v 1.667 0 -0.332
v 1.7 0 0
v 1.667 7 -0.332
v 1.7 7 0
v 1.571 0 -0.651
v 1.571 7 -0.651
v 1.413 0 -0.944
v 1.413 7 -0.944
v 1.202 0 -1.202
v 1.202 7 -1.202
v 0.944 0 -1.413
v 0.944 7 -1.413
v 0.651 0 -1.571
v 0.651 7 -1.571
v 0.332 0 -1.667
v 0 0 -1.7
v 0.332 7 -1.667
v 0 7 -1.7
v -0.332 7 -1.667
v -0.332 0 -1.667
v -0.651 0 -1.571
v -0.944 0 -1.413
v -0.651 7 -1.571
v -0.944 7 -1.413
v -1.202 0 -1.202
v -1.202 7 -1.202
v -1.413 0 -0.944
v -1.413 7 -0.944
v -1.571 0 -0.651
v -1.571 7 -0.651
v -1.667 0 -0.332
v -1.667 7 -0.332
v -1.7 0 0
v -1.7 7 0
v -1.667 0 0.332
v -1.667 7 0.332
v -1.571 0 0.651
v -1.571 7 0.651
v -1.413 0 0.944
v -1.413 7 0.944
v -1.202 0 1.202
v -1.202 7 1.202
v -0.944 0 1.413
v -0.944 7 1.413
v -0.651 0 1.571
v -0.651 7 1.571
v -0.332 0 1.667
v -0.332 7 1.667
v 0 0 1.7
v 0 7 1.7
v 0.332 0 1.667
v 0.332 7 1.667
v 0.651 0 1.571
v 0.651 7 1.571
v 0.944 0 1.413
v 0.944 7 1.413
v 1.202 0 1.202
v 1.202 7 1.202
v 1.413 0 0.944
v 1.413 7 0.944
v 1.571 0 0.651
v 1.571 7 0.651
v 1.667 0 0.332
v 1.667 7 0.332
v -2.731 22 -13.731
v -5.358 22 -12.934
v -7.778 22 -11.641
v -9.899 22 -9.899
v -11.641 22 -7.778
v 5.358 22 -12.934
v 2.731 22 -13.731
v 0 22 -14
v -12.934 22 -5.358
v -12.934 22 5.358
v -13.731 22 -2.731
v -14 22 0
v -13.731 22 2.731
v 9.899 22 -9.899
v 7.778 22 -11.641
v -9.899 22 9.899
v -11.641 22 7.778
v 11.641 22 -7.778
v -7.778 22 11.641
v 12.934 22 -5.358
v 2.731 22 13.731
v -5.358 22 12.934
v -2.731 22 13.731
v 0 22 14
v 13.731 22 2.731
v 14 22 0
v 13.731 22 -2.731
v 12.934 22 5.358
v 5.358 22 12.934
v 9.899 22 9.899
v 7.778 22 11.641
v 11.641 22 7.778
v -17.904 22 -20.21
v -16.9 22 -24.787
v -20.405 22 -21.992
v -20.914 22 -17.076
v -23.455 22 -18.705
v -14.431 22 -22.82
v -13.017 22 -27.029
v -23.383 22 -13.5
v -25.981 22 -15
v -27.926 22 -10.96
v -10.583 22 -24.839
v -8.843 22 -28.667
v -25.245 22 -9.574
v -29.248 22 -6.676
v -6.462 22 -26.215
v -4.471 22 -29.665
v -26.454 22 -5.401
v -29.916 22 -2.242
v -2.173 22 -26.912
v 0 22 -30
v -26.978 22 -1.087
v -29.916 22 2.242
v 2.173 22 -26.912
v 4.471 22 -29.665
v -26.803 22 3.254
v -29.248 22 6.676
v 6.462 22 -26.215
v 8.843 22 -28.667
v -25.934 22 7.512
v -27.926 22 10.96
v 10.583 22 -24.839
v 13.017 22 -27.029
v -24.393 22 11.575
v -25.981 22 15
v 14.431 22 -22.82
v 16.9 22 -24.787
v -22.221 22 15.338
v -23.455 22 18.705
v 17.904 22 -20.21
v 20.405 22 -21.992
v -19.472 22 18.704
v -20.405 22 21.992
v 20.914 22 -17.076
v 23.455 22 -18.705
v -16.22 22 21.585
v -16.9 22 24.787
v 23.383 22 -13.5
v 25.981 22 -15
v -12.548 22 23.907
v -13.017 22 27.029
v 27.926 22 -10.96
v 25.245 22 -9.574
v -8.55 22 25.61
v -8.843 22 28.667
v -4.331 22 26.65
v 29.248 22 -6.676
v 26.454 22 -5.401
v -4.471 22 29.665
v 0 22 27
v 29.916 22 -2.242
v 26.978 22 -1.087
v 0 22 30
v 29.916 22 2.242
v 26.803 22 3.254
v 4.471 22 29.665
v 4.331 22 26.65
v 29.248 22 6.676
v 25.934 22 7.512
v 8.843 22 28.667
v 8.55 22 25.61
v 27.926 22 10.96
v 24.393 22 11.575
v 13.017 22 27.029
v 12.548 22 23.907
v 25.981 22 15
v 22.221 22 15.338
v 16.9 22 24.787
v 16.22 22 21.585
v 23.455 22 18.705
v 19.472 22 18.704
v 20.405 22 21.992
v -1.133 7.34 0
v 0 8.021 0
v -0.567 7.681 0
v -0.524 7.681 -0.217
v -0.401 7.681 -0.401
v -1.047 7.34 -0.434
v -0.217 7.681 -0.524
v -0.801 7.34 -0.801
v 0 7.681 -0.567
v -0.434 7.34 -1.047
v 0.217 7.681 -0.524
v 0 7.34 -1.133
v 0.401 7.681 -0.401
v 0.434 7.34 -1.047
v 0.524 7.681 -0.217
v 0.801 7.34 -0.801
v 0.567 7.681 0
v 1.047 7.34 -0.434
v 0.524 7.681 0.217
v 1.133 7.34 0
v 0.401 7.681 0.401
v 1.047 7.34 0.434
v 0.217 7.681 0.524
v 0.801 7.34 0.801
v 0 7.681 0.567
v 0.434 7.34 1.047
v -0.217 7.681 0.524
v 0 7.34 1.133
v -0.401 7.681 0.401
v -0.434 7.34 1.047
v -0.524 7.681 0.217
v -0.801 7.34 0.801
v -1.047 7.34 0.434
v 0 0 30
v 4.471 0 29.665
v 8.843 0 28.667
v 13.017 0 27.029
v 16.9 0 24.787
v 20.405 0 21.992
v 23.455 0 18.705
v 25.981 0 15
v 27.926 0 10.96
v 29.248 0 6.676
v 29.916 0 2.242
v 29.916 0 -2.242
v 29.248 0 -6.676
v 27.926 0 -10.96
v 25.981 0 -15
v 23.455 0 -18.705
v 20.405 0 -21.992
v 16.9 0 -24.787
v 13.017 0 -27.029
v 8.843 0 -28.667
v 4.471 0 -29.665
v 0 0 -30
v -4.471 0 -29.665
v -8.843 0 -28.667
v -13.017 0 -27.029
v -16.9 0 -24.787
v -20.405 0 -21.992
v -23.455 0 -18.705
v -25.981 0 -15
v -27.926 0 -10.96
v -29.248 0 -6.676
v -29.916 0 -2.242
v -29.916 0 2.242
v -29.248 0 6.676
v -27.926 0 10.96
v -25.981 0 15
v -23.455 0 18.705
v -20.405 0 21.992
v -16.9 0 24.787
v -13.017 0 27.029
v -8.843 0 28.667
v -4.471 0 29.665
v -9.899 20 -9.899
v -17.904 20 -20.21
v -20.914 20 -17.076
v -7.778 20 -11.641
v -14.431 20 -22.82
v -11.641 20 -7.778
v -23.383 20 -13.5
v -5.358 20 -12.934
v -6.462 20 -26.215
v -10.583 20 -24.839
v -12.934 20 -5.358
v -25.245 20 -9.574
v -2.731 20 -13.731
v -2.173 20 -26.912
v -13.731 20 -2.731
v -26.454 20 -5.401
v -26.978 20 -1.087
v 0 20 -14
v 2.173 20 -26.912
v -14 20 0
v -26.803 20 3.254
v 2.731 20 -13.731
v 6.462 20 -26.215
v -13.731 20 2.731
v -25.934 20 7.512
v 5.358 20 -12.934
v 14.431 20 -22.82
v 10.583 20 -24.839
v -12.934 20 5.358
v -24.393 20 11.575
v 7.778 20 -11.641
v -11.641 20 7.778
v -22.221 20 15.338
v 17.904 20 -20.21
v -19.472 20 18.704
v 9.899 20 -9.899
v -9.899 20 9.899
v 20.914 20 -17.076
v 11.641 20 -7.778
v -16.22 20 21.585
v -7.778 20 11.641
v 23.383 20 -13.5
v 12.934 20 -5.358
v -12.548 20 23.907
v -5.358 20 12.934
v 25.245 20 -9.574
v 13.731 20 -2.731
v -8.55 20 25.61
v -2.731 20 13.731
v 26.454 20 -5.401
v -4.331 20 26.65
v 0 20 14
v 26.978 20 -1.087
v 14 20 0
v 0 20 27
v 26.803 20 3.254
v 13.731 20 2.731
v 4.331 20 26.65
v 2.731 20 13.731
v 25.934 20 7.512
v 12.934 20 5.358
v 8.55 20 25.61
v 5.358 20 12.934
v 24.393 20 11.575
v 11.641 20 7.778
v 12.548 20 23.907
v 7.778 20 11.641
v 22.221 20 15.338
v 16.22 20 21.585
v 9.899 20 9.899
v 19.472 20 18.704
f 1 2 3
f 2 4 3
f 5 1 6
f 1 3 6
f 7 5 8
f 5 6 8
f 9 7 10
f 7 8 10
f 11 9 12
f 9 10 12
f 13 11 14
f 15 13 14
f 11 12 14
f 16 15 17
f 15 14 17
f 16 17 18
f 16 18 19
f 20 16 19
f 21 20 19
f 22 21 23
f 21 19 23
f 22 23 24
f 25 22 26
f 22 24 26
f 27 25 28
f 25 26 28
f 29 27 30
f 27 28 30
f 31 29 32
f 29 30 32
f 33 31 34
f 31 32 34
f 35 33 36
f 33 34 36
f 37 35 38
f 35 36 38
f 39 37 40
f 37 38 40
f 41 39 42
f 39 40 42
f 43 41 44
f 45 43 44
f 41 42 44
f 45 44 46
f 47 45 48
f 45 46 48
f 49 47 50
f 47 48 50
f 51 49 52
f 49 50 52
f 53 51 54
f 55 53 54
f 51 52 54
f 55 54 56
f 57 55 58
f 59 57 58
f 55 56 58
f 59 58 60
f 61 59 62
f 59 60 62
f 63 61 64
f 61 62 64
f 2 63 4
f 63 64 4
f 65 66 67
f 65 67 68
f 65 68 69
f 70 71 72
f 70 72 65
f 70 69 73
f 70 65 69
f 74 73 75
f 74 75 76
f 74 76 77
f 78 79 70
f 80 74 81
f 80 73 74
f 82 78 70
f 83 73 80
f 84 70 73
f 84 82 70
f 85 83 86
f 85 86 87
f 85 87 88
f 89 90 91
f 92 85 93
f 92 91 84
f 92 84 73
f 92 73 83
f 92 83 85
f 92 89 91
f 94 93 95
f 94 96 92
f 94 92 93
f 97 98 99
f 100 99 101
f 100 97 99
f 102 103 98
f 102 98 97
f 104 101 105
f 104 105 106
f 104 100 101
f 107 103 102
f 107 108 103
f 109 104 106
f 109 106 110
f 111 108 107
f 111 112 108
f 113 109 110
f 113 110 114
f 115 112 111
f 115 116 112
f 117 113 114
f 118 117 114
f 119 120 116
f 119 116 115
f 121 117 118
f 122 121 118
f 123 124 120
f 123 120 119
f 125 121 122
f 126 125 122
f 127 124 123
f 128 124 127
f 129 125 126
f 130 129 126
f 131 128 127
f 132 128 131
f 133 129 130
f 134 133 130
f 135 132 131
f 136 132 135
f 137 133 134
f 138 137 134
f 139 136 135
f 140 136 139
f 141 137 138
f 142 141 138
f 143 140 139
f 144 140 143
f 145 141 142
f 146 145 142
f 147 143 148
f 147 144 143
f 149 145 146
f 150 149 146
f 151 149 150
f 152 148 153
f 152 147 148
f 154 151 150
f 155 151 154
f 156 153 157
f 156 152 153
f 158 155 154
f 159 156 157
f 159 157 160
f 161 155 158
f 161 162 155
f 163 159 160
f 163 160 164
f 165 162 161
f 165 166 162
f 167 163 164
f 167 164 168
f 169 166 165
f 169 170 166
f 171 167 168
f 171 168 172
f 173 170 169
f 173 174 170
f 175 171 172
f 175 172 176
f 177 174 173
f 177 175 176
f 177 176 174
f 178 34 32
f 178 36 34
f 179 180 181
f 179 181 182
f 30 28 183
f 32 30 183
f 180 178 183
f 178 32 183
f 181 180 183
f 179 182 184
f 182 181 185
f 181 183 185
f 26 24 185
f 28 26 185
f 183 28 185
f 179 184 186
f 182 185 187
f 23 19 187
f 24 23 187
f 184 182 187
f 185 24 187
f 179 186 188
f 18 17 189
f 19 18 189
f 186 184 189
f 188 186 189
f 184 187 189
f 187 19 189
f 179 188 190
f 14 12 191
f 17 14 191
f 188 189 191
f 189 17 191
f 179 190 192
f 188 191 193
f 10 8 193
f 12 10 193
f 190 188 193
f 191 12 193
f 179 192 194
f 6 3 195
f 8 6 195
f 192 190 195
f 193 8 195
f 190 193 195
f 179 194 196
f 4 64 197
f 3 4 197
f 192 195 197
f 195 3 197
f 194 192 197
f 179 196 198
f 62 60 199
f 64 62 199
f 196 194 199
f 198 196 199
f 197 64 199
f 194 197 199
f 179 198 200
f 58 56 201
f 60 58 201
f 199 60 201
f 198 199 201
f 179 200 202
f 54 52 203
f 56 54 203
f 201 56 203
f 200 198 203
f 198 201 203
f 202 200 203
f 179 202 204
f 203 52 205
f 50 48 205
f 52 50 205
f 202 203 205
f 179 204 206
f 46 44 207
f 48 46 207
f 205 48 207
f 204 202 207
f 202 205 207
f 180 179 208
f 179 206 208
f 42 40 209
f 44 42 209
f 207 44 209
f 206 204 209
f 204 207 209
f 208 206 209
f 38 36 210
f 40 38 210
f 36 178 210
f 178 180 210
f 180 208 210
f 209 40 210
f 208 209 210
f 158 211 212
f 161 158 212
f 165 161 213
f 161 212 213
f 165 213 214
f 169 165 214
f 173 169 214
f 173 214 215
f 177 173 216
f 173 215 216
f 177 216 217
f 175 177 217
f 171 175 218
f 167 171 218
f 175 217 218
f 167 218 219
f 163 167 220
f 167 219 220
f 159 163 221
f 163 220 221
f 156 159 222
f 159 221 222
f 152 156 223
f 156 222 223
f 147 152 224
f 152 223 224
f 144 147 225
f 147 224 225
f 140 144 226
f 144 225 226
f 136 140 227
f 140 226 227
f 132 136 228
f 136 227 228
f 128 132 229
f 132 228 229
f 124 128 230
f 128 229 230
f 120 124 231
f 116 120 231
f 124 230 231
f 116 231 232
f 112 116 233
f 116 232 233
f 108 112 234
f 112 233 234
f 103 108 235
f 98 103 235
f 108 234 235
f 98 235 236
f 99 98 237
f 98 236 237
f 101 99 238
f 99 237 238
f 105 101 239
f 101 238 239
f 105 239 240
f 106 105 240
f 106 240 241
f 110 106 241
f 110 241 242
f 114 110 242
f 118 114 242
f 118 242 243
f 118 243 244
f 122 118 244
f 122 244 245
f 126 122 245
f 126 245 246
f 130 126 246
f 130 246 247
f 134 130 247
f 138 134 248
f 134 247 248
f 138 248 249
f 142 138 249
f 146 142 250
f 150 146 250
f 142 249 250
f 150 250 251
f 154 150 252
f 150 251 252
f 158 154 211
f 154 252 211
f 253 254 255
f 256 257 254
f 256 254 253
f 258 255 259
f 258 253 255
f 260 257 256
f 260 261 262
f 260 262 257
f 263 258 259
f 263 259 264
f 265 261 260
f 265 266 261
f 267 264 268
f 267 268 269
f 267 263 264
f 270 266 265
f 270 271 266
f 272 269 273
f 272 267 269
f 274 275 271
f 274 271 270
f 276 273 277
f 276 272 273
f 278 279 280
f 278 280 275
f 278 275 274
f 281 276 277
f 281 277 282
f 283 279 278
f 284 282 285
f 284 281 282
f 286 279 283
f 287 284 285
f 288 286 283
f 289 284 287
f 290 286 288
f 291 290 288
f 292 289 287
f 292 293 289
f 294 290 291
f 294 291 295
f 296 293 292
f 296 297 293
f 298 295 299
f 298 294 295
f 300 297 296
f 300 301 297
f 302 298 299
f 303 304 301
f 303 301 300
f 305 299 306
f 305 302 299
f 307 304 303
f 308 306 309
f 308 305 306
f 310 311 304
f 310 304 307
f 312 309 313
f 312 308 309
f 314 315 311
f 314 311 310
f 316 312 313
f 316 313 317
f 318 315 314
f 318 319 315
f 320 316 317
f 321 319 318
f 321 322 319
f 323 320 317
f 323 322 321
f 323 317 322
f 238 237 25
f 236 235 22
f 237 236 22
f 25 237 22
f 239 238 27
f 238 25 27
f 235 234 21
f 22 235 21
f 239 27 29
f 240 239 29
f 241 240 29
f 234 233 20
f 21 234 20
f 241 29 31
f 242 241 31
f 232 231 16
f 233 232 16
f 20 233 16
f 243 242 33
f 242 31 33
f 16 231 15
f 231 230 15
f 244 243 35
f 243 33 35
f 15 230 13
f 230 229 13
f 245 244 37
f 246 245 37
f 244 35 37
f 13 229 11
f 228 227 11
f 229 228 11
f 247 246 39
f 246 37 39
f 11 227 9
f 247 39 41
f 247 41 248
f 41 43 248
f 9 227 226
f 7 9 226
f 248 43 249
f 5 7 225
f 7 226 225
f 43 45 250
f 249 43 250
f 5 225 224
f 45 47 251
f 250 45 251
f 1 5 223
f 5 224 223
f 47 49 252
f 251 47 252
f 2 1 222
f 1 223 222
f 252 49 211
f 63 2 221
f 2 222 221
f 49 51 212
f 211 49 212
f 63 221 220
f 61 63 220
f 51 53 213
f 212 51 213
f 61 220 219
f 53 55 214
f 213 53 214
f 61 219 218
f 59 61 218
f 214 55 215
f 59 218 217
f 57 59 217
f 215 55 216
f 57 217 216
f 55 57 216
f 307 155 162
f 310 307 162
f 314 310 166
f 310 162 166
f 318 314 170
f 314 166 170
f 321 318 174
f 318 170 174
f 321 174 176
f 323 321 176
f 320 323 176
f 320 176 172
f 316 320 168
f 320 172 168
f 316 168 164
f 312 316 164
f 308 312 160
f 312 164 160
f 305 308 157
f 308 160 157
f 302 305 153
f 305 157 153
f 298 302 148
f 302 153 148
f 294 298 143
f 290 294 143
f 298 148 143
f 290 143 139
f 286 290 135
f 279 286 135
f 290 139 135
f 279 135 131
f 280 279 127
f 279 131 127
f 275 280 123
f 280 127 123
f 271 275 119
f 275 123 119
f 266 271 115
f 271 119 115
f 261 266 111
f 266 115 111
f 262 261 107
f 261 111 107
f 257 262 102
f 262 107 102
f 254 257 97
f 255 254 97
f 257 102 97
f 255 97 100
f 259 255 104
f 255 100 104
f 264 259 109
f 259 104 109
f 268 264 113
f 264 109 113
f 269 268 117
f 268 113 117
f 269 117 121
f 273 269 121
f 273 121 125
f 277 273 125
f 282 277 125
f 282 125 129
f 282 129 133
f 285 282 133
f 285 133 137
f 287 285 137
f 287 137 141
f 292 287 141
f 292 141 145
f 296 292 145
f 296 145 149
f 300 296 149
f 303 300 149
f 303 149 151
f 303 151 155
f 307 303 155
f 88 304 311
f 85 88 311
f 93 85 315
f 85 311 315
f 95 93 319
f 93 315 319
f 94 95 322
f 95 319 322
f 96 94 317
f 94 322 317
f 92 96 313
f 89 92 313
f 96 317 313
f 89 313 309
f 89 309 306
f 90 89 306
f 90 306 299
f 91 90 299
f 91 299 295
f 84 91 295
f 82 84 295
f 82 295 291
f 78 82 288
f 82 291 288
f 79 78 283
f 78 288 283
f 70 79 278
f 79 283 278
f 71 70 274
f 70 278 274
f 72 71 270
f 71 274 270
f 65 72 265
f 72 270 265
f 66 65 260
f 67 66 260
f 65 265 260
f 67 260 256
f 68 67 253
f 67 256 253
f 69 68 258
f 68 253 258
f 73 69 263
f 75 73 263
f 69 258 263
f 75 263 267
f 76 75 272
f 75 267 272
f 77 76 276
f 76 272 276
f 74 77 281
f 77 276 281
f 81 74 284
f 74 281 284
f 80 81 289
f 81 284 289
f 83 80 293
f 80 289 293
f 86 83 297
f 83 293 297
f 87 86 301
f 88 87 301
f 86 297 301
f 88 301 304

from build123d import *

# Parameters (mm, degrees)
SKETCH1_R                = 30
BOSS_EXTRUDE1_DEPTH      = 22
SKETCH2_R                = 27
CUT_EXTRUDE1_DEPTH       = 2
SKETCH3_R                = 14
BOSS_EXTRUDE2_DEPTH      = 2
M3_CLEARANCE_HOLE1_D     = 3.4
M3_CLEARANCE_HOLE1_DEPTH = 7
M3_CLEARANCE_HOLE1_TIP   = 1.021463052


with BuildPart() as part:
    # Sketch1 → Boss-Extrude1 (new body)
    with BuildSketch(Plane(origin=(0, 0, 0), x_dir=(1, 0, 0), z_dir=(0, 1, 0))):
        with Locations(Location((0, 0, 0), (0, 0, 270))):
            Circle(SKETCH1_R)
    extrude(amount=BOSS_EXTRUDE1_DEPTH)

    # Sketch2 → Cut-Extrude1 (cut)
    with BuildSketch(Plane(origin=(0, 22, 0), x_dir=(1, 0, 0), z_dir=(0, 1, 0))):
        with Locations(Location((0, 0, 0), (0, 0, 270))):
            Circle(SKETCH2_R)
    extrude(amount=-CUT_EXTRUDE1_DEPTH, mode=Mode.SUBTRACT)

    # Sketch3 → Boss-Extrude2 (add)
    with BuildSketch(Plane(origin=(0, 20, 0), x_dir=(1, 0, 0), z_dir=(0, 1, 0))):
        with Locations(Location((0, 0, 0), (0, 0, 270))):
            Circle(SKETCH3_R)
    extrude(amount=BOSS_EXTRUDE2_DEPTH)

    # M3 Clearance Hole1
    with Locations(Plane(origin=(0, 0, 0), x_dir=(-1, 0, 0), z_dir=(0, -1, 0))):
        with Locations((0, 0)):
            Hole(M3_CLEARANCE_HOLE1_D / 2, depth=M3_CLEARANCE_HOLE1_DEPTH)
            with Locations((0, 0, -(M3_CLEARANCE_HOLE1_DEPTH + M3_CLEARANCE_HOLE1_TIP / 2))):  # 118° drill point
                Cone(0, M3_CLEARANCE_HOLE1_D / 2, M3_CLEARANCE_HOLE1_TIP, mode=Mode.SUBTRACT)


solid = part.part
